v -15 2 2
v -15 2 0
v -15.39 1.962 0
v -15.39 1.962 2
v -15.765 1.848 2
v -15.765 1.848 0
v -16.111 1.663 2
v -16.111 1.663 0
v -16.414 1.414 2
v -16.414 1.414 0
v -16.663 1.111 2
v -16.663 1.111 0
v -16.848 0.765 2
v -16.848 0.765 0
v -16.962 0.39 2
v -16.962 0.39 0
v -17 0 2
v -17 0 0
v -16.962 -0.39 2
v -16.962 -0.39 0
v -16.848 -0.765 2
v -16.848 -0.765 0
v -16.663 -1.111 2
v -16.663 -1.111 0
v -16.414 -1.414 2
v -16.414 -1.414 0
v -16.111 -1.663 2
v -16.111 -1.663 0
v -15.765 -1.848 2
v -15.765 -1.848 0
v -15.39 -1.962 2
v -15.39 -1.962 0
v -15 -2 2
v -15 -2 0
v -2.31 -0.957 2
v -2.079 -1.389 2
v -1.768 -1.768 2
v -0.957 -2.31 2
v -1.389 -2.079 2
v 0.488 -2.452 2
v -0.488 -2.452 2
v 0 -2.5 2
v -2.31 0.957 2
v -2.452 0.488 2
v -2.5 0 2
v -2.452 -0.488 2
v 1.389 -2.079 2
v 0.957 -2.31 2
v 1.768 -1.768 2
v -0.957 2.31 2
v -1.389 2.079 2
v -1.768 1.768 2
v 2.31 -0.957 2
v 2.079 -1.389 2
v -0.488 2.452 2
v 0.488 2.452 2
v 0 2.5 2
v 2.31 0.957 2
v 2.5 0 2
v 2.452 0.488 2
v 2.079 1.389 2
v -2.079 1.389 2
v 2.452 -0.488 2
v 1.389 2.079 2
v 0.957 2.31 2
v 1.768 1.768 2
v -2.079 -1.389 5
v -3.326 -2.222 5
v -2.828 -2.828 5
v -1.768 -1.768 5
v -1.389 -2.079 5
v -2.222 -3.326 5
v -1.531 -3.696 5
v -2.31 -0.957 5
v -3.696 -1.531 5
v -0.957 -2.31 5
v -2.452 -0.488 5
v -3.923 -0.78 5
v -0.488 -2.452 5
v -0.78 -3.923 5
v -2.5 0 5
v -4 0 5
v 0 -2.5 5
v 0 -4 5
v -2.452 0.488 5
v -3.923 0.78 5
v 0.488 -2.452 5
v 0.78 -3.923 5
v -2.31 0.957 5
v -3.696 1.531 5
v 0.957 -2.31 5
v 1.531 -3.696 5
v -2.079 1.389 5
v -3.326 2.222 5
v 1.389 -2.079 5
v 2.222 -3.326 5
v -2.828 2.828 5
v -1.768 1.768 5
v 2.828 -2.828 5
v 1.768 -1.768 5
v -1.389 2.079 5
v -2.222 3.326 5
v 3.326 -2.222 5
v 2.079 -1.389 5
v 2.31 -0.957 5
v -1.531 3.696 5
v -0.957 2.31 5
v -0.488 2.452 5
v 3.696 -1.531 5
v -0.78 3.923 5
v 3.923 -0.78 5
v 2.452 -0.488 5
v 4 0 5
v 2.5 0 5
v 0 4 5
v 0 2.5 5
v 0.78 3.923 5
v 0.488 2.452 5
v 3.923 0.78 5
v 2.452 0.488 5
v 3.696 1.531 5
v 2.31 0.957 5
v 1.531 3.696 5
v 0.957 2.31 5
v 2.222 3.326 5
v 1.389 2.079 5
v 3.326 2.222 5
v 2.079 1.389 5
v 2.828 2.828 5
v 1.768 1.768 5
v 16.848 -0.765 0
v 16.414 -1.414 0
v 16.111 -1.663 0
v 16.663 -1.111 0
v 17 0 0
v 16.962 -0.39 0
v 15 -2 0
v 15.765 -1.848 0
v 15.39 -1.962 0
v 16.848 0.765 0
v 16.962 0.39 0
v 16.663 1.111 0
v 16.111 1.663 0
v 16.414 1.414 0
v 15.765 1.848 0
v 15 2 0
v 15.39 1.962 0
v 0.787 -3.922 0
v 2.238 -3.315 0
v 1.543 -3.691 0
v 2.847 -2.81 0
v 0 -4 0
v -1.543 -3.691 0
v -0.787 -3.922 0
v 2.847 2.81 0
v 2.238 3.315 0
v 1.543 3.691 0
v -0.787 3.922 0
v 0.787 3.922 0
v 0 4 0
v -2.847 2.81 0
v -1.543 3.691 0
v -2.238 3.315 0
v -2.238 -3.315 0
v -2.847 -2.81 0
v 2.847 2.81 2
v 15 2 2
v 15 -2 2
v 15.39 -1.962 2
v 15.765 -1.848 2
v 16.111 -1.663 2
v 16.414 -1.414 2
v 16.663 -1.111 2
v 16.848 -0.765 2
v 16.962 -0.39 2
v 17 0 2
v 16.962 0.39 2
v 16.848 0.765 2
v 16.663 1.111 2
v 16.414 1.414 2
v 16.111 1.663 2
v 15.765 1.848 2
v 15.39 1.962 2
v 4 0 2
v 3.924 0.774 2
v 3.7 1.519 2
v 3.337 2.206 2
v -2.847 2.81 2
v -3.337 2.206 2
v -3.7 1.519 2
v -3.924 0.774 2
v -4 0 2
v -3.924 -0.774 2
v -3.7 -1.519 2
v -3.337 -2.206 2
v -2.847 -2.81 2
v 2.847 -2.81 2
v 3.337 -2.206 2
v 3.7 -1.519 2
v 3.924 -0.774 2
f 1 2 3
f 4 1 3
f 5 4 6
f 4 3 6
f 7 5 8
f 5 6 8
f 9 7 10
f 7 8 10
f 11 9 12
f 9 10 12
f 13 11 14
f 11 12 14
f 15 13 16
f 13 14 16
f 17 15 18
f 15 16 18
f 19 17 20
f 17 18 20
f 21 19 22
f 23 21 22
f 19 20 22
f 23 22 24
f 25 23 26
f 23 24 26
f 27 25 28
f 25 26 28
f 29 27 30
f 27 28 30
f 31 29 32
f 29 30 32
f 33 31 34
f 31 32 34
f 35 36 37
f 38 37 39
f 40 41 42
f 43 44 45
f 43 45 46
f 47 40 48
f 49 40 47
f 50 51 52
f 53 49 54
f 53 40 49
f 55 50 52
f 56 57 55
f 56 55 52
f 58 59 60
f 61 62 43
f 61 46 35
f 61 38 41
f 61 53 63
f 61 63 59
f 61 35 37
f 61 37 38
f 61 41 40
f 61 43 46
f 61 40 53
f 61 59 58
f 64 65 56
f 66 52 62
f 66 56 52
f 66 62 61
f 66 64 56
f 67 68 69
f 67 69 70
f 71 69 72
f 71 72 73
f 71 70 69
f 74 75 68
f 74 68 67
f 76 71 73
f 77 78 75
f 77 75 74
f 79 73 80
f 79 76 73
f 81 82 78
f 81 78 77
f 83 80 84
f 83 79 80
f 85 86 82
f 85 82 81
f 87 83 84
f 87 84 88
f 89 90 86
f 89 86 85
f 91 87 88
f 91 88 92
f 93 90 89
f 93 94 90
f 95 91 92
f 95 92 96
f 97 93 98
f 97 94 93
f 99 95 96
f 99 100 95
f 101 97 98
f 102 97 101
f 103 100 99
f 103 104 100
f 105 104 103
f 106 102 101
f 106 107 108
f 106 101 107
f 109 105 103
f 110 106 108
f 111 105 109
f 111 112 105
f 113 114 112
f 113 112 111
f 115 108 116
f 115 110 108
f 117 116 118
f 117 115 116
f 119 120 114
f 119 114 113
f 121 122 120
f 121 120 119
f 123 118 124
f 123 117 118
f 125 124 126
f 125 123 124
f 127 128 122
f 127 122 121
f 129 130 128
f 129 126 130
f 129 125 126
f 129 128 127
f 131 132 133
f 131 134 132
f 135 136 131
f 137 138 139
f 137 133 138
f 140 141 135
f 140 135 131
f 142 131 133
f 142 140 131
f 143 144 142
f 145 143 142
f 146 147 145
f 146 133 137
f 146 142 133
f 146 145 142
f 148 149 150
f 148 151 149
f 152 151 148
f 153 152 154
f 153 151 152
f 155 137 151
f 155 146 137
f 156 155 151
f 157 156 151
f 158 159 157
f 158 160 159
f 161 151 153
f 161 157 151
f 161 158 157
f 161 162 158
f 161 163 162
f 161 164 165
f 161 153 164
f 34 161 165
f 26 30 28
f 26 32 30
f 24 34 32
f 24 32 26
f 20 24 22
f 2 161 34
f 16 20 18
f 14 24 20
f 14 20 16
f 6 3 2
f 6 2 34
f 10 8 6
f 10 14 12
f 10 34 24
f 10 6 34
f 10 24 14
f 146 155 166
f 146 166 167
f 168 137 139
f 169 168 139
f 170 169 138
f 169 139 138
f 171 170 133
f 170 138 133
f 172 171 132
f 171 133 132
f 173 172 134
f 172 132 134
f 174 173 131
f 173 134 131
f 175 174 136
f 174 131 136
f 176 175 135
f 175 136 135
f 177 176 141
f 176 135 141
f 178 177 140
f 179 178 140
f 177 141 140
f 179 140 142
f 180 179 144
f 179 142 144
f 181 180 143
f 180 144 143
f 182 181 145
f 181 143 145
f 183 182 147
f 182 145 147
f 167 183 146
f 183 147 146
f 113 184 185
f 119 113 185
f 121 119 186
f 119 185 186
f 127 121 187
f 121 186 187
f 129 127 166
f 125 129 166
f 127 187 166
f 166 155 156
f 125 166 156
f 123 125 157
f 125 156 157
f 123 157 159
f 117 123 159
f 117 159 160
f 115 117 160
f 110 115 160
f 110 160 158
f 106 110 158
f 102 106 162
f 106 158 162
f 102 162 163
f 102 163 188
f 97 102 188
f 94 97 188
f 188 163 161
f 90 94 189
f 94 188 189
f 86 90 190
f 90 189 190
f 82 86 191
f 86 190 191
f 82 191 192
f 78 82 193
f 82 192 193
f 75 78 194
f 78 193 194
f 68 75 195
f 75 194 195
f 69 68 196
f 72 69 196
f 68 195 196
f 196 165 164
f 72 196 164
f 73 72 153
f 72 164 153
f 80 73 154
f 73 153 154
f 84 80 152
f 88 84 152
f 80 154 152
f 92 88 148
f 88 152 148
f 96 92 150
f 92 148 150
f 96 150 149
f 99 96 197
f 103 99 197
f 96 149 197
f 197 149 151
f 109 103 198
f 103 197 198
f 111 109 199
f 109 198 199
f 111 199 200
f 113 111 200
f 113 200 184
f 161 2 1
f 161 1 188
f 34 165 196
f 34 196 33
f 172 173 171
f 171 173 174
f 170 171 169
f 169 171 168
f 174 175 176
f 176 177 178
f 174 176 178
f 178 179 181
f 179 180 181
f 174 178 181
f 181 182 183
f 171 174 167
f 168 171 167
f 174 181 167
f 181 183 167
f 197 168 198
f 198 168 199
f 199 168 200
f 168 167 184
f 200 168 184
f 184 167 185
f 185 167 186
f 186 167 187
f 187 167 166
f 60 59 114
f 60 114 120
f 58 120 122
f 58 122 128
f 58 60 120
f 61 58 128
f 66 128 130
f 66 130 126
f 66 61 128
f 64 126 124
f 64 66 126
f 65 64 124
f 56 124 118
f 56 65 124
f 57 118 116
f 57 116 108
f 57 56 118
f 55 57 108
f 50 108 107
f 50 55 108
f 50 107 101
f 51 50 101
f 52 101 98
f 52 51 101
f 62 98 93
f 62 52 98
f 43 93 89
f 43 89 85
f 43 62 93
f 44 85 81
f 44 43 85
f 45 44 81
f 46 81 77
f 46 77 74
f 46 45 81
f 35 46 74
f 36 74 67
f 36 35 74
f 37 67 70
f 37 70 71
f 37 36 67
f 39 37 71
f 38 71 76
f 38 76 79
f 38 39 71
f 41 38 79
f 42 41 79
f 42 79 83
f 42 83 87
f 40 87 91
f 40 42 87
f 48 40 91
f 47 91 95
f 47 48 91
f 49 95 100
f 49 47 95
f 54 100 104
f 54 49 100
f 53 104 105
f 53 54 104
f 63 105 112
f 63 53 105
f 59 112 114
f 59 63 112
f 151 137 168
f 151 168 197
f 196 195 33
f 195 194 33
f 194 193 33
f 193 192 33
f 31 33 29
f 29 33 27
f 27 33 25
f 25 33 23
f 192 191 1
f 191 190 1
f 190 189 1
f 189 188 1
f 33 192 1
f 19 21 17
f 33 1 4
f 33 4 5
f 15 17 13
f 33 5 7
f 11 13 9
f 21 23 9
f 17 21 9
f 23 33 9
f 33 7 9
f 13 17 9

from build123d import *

# Parameters (mm, degrees)
CYLINDER001_R     = 2.5
CYLINDER001_DEPTH = 3
CYLINDER_R        = 4
CYLINDER_DEPTH    = 5
PAD_DEPTH         = 2


with BuildPart() as cylinder001:
    # Cylinder001 → Cylinder001 (new body)
    with BuildSketch(Plane.XY.offset(2)):
        Circle(CYLINDER001_R)
    extrude(amount=CYLINDER001_DEPTH)


with BuildPart() as cut:
    # Cylinder → Cylinder (new body)
    with BuildSketch(Plane.XY):
        Circle(CYLINDER_R)
    extrude(amount=CYLINDER_DEPTH)

    # Cut: cut Cylinder001
    add(cylinder001.part, mode=Mode.SUBTRACT)


with BuildPart() as servo_arm:
    # Sketch → Pad (new body)
    with BuildSketch(Plane.XY):
        with BuildLine():
            Line((-15, 2), (0, 3))
            Line((0, 3), (15, 2))
            ThreePointArc((15, -2), (17, 0), (15, 2))
            Line((15, -2), (0, -3))
            Line((0, -3), (-15, -2))
            ThreePointArc((-15, 2), (-17, 0), (-15, -2))
        make_face()
    extrude(amount=PAD_DEPTH)

    # Fusion: union Cut
    add(cut.part)


solid = servo_arm.part
